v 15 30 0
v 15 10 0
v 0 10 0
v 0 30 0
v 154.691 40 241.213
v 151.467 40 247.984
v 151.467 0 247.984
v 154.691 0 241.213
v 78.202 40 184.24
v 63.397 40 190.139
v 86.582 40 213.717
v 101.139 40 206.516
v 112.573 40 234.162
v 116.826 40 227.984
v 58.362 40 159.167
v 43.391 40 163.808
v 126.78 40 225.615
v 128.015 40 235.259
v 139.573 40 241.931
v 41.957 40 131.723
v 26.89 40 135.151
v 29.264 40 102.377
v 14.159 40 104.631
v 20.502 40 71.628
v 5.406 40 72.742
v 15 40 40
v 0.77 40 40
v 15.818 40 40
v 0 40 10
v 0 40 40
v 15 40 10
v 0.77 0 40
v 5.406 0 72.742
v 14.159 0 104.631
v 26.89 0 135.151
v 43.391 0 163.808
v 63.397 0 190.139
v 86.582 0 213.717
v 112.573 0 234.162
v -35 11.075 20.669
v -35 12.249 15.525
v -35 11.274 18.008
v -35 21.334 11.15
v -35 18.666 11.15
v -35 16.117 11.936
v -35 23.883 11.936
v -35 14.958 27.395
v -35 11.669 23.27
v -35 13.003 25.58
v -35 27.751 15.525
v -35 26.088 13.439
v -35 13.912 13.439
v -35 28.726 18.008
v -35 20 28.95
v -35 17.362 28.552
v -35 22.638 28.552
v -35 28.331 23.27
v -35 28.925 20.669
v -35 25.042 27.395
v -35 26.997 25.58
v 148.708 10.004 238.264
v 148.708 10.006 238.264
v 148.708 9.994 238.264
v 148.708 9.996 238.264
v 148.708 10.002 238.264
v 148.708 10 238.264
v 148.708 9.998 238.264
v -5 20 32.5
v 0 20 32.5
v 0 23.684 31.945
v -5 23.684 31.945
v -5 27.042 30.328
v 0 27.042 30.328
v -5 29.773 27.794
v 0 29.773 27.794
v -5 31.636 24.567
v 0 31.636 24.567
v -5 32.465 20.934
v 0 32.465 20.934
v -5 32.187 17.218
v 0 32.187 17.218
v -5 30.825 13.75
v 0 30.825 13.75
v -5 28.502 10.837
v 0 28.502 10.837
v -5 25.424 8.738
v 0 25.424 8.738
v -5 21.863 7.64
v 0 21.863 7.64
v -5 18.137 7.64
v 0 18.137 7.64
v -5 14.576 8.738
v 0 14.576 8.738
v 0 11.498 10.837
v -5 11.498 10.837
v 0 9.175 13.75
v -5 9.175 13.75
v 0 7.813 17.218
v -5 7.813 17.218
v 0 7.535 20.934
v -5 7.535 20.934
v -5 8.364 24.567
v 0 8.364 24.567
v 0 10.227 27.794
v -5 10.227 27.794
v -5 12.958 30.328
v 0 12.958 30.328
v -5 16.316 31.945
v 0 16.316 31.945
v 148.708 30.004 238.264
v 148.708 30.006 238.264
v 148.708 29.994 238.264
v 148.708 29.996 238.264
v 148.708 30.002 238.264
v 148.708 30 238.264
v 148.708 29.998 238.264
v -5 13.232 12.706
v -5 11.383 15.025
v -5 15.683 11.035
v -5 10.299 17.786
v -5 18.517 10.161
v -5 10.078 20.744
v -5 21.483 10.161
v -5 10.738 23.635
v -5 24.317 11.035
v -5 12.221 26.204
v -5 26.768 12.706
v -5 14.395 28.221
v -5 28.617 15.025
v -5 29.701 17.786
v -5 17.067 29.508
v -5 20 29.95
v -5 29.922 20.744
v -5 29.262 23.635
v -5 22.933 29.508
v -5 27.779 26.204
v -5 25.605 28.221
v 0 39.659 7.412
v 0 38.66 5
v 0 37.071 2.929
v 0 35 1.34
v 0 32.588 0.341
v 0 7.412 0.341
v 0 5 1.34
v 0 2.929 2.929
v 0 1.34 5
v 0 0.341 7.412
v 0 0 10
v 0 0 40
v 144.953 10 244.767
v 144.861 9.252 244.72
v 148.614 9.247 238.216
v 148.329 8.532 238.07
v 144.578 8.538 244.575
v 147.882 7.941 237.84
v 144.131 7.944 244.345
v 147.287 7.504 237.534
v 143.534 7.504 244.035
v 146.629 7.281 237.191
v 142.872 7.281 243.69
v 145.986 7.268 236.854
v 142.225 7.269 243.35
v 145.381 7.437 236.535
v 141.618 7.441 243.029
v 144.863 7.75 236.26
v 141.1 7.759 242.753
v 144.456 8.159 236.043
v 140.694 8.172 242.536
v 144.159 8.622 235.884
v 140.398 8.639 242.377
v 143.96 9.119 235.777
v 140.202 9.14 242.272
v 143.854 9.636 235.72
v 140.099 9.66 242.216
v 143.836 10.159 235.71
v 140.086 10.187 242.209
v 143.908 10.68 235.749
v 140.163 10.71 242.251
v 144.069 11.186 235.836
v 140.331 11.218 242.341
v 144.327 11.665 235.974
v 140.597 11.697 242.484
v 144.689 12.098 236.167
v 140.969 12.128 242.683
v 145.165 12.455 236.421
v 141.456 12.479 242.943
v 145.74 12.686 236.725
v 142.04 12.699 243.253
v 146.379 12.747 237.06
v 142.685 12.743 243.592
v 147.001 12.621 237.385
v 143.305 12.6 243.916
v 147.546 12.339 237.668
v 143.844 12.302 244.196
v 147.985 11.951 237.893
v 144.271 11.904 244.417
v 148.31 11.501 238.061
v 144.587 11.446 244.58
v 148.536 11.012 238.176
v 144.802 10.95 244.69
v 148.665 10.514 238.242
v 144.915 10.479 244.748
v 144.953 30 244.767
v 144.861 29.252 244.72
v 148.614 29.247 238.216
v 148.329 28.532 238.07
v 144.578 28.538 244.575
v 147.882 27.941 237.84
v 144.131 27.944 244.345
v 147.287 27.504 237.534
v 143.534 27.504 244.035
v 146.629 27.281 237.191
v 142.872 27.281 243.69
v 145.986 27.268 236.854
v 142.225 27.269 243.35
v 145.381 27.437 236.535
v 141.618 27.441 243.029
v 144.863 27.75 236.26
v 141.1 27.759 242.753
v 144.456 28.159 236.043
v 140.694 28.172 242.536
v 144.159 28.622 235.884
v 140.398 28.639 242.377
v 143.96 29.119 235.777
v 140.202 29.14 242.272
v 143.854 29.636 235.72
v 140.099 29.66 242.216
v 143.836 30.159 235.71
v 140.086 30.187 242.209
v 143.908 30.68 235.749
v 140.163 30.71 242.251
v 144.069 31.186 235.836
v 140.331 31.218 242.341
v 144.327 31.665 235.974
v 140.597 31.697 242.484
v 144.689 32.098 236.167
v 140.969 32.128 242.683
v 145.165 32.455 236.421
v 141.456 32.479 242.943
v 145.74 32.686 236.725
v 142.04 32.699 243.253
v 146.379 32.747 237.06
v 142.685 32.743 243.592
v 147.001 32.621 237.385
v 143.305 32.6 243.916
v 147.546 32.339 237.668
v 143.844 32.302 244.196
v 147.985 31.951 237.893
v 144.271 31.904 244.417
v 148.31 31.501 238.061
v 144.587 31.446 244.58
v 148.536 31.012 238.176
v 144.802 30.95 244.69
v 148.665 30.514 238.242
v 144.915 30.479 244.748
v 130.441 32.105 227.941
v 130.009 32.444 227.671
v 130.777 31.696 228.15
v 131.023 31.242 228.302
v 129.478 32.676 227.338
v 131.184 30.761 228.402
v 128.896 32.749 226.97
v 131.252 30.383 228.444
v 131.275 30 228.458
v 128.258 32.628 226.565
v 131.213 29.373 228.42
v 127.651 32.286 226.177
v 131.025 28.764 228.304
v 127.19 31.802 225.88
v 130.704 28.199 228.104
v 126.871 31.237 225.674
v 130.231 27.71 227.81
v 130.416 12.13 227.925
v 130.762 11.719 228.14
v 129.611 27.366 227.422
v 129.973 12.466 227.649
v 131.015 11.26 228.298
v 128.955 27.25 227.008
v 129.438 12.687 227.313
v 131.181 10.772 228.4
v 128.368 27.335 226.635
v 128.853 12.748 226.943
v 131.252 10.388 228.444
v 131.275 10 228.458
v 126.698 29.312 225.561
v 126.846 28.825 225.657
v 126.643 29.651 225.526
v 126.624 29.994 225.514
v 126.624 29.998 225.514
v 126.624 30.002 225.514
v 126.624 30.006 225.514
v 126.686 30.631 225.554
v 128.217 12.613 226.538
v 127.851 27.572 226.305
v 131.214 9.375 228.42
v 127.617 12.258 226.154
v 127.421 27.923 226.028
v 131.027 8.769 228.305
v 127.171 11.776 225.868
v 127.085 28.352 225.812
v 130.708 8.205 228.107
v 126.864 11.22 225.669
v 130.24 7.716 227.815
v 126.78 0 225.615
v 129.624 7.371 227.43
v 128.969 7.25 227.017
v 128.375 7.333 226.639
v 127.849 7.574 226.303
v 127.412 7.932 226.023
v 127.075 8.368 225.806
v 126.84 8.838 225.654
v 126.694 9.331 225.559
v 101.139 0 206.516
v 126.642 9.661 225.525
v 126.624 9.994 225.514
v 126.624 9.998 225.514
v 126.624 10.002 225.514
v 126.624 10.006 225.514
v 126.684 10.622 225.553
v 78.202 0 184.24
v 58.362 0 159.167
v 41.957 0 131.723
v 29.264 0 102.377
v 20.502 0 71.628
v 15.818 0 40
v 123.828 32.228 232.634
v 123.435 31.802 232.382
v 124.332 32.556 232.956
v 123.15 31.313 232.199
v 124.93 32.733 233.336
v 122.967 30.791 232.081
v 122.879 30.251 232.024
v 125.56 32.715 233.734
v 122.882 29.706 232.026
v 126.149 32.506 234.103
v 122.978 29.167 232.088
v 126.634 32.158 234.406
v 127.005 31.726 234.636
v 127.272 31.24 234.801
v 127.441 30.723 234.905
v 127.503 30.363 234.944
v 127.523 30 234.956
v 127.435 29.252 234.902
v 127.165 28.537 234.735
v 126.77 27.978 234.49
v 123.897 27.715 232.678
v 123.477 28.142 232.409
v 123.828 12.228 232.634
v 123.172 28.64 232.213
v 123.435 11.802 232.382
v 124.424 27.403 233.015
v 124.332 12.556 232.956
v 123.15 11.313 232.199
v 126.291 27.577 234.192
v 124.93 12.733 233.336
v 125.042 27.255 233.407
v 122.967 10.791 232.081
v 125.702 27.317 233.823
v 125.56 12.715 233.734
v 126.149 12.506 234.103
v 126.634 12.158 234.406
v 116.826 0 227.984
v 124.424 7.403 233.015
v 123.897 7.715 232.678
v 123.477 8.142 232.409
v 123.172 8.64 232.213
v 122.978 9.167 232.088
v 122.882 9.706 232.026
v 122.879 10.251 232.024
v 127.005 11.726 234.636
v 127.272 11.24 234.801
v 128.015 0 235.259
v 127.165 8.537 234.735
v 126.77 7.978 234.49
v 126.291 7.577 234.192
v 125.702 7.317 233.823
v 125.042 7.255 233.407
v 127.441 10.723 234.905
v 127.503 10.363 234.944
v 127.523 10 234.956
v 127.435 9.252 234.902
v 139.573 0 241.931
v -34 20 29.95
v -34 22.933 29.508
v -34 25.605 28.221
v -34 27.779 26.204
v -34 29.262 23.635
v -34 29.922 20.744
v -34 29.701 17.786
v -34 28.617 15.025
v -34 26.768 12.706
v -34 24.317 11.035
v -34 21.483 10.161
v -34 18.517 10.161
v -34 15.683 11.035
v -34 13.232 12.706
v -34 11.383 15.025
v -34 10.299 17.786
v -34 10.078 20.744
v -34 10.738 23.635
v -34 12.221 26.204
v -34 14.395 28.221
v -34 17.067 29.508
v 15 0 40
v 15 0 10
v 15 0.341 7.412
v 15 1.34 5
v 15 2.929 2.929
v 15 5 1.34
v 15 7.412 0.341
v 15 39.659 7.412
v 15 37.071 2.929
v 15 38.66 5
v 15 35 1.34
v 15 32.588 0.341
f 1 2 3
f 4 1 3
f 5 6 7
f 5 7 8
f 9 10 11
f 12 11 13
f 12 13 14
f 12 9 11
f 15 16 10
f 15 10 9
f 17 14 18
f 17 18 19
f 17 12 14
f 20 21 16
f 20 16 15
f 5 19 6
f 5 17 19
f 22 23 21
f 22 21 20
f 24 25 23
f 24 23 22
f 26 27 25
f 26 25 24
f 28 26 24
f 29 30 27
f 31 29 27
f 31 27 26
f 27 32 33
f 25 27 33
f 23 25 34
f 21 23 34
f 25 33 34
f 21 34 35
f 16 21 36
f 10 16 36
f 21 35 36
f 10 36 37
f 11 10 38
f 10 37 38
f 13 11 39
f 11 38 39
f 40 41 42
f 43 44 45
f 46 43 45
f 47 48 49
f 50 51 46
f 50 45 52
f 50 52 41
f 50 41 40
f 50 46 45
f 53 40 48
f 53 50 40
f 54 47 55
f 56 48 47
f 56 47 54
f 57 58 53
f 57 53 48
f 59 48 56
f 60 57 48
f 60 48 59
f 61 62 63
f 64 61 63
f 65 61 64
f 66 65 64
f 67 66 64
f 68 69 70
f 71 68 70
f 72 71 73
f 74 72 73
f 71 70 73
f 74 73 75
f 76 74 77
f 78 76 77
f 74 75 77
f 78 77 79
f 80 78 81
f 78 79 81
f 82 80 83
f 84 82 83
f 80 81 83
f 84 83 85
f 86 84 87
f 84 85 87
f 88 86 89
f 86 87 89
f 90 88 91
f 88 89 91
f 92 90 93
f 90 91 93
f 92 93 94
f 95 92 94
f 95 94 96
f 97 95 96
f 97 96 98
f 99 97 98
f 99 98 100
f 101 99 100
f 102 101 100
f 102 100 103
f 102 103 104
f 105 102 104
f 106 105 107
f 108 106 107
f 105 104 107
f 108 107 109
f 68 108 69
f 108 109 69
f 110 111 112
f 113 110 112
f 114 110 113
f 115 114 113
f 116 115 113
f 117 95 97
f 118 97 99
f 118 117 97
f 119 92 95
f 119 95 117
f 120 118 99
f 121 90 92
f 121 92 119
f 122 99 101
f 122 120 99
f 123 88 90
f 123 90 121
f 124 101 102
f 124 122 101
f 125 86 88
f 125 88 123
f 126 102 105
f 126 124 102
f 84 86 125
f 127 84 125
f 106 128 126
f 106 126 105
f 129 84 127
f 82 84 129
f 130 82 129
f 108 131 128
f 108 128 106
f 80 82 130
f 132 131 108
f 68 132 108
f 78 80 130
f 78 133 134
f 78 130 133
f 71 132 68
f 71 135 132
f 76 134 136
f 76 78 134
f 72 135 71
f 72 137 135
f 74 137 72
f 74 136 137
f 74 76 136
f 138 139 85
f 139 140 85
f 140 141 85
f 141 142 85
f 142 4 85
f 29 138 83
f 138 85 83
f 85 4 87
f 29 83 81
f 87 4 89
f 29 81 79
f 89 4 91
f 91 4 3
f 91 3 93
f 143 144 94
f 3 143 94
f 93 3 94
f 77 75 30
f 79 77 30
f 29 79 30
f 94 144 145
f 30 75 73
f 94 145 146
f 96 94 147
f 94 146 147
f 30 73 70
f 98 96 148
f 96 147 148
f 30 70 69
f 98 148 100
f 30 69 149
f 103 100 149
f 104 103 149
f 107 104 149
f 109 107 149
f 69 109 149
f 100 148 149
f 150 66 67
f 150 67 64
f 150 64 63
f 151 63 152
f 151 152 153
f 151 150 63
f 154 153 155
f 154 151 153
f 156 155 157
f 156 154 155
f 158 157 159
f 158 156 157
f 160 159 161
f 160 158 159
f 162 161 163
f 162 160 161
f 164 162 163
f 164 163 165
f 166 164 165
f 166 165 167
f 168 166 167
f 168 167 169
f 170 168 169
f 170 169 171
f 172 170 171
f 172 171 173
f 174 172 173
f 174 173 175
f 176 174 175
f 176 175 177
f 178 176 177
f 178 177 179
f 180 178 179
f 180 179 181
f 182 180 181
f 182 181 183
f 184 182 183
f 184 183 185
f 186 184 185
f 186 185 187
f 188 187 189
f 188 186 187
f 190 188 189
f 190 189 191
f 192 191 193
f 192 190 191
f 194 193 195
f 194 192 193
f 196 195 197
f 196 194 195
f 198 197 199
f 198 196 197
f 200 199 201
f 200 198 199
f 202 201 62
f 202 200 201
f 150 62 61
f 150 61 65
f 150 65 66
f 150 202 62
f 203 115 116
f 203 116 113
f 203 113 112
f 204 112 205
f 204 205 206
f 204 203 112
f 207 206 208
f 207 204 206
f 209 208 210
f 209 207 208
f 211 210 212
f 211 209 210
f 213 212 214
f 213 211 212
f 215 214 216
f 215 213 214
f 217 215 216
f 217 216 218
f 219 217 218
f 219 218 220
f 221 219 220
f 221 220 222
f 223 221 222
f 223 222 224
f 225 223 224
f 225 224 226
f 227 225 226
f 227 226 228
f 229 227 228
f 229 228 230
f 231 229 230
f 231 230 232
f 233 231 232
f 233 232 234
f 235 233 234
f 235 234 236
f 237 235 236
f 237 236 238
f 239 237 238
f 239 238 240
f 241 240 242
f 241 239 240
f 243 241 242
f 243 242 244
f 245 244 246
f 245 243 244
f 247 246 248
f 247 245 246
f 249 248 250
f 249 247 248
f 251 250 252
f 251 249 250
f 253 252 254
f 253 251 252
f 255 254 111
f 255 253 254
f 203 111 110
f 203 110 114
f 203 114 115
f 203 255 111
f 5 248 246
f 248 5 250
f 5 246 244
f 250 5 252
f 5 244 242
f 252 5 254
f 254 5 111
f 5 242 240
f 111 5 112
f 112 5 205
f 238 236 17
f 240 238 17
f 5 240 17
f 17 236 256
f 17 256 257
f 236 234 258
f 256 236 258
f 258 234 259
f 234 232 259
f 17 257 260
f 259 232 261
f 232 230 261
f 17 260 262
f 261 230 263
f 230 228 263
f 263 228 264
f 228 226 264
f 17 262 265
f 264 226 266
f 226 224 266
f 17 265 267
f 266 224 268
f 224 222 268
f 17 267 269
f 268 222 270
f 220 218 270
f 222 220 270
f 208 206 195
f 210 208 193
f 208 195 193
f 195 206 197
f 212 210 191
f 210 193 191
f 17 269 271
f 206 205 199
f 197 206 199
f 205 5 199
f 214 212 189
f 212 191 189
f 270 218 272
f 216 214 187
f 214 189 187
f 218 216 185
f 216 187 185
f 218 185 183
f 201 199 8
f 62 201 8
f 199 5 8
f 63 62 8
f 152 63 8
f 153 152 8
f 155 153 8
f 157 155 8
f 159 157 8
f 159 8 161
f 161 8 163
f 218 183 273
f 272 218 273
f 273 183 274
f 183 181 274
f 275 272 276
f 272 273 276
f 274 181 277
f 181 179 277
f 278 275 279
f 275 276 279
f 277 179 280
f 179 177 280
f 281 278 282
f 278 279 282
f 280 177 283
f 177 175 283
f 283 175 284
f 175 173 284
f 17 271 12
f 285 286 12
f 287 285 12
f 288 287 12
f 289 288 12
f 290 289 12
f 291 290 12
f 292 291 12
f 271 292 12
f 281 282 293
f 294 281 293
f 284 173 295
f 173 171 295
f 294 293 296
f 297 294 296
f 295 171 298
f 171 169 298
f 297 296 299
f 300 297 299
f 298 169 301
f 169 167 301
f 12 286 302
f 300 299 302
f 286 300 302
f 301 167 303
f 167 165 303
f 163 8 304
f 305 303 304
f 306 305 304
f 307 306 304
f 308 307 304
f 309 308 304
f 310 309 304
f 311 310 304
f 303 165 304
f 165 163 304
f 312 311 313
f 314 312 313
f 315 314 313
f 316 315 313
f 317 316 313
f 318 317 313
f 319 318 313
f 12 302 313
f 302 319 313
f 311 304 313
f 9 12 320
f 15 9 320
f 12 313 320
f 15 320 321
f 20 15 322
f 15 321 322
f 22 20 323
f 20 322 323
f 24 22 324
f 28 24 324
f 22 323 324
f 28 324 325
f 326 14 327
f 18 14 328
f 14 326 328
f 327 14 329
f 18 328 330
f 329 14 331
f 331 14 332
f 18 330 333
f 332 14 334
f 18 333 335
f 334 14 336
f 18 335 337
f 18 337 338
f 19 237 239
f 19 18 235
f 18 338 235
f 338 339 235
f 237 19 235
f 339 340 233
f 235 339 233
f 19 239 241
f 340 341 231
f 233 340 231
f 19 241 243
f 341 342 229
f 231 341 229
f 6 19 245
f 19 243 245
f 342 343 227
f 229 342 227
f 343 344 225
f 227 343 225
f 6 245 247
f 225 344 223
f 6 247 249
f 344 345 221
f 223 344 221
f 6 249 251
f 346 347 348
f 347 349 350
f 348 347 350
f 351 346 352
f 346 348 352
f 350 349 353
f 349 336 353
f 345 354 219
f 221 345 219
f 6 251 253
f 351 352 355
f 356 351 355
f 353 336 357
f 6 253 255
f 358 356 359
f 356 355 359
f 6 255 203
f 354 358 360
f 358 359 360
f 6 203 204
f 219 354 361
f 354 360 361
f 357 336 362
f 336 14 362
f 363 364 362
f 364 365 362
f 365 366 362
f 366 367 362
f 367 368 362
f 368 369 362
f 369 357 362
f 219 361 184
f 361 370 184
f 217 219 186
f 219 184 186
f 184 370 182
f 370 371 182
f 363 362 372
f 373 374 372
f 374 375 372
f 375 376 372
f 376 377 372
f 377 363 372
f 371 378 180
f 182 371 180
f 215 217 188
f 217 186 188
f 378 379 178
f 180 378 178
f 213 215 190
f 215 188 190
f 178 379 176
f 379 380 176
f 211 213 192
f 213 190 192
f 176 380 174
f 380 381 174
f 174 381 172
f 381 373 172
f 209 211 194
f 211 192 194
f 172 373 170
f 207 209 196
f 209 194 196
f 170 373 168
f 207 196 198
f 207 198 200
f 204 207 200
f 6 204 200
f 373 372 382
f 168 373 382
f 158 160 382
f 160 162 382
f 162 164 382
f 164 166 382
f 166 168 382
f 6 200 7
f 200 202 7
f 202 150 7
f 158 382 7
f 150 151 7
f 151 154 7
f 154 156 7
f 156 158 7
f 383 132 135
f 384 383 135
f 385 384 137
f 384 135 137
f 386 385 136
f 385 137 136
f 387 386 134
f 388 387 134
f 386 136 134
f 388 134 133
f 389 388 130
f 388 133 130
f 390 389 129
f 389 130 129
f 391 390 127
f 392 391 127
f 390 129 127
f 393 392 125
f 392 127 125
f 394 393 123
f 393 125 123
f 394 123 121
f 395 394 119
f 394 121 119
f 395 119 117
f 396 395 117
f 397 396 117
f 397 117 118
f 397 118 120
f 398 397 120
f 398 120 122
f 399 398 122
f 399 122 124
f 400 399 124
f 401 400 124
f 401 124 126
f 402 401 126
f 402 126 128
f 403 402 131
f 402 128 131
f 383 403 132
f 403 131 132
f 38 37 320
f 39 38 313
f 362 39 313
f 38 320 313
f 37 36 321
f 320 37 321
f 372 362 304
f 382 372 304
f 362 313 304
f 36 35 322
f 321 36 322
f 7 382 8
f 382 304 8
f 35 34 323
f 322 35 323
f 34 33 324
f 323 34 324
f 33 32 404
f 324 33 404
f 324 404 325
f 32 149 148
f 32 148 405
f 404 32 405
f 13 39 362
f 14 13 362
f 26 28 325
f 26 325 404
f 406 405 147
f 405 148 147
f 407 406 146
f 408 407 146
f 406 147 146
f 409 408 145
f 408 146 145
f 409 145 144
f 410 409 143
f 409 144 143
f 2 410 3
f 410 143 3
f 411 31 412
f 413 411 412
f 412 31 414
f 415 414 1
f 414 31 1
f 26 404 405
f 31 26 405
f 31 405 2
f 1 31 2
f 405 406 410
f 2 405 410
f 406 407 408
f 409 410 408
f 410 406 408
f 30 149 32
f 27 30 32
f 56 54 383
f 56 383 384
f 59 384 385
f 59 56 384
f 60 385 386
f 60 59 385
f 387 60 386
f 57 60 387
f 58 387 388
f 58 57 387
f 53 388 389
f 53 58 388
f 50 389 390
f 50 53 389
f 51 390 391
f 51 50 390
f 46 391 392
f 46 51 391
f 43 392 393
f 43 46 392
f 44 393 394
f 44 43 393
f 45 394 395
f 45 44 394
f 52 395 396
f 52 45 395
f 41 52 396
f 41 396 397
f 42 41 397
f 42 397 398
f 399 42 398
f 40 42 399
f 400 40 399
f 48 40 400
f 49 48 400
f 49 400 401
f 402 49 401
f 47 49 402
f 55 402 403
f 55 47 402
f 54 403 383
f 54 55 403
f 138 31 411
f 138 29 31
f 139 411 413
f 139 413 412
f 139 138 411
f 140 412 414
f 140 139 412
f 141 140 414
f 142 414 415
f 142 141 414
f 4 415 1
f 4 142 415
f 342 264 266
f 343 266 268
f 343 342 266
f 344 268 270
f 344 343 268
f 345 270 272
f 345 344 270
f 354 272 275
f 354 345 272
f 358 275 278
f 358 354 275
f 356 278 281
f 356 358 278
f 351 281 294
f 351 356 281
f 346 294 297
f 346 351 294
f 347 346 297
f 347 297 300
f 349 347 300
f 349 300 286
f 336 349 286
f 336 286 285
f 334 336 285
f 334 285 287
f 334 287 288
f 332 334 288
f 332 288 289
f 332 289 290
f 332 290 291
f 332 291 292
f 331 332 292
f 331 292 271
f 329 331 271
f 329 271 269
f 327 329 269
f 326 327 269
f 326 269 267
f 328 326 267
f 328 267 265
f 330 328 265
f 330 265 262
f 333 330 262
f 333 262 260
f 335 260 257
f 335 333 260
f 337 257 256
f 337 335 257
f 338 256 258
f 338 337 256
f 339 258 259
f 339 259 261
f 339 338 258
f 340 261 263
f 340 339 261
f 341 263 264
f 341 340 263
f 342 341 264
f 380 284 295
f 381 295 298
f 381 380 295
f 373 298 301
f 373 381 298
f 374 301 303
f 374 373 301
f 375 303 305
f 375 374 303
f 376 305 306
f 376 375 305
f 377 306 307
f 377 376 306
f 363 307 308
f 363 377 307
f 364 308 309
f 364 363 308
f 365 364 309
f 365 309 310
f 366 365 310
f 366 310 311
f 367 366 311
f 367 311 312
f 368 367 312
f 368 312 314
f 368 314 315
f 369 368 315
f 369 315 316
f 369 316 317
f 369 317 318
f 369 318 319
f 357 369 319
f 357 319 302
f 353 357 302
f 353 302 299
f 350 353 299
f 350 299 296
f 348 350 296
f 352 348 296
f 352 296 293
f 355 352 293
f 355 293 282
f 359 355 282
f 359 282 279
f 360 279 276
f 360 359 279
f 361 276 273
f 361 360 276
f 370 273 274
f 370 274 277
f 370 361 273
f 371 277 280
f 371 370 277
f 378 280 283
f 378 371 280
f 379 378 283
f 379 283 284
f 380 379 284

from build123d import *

# Parameters (mm, degrees)
BOSS_EXTRUDE4_DEPTH          = 40
SKETCH18_R                   = 12.5
BOSS_EXTRUDE2_DEPTH          = 5
SKETCH19_R                   = 9.95
BOSS_EXTRUDE3_DEPTH          = 30
FILLET1_R                    = 10
M5_START                     = -139.716402581
M5_CLEARANCE_HOLE2_OUTLINE_R = 2.75
M5_CLEARANCE_HOLE2_DEPTH     = 7.727879289
CHAMFER1_SIZE                = 1


# Read off the part's stored shape, not the designer's step: M5 Clearance Hole2
with BuildPart() as part:
    # Sketch20 → Boss-Extrude4 (new body)
    with BuildSketch(Plane(origin=(0, 0, 0), x_dir=(1, 0, 0), z_dir=(0, 1, 0))):
        with BuildLine():
            Line((112.573466187, -234.162128136), (116.826154662, -227.98437444))
            ThreePointArc((116.826154662, -227.98437444), (133.75, -238.671414456), (151.467170814, -247.98437444))
            Line((151.467170814, -247.98437444), (154.690918215, -241.212561338))
            ThreePointArc((154.690918215, -241.212561338), (58.362499128, -159.166512646), (15.817691059, -40))
            Line((15.817691059, -40), (15, -40))
            Line((15, -40), (15, -20))
            Line((15, -20), (15, 0))
            Line((15, 0), (0, 0))
            Line((0, 0), (0, -20))
            Line((0, -20), (0, -40))
            Line((0, -40), (0.770372064, -40))
            ThreePointArc((0.770372064, -40), (34.68457338, -149.741891952), (112.573466187, -234.162128136))
        make_face()
    extrude(amount=BOSS_EXTRUDE4_DEPTH)

    # Sketch18 → Boss-Extrude2 (add)
    with BuildSketch(Plane.ZY):
        with Locations((20, 20)):
            Circle(SKETCH18_R)
    extrude(amount=BOSS_EXTRUDE2_DEPTH)

    # Sketch19 → Boss-Extrude3 (add)
    with BuildSketch(Plane.ZY.offset(5)):
        with Locations((20, 20)):
            Circle(SKETCH19_R)
    extrude(amount=BOSS_EXTRUDE3_DEPTH)

    # Fillet1
    fillet1_edges = [part.edges().sort_by_distance(p)[0] for p in [
        (7.5, 0, 0),
        (7.5, 40, 0),
    ]]
    fillet(fillet1_edges, radius=FILLET1_R)

    # M5 Clearance Hole2 outline → M5 Clearance Hole2 (cut)
    with BuildSketch(Plane(origin=(0, 0, 0), x_dir=(0.8660254037844398, 0, 0.499999999999998), z_dir=(0.49999999999999795, 0, -0.8660254037844399)).offset(M5_START)):
        with Locations((245.166604984, -30)):
            Circle(M5_CLEARANCE_HOLE2_OUTLINE_R)
        with Locations((225.166604984, -10)):
            Circle(M5_CLEARANCE_HOLE2_OUTLINE_R)
        with Locations((225.166604984, -30)):
            Circle(M5_CLEARANCE_HOLE2_OUTLINE_R)
        with Locations((245.166604984, -10)):
            Circle(M5_CLEARANCE_HOLE2_OUTLINE_R)
    extrude(amount=M5_CLEARANCE_HOLE2_DEPTH, mode=Mode.SUBTRACT)

    # Chamfer1
    chamfer1_edges = [part.edges().sort_by_distance(p)[0] for p in [
        (-35, 20, 10.05),
    ]]
    chamfer(chamfer1_edges, length=CHAMFER1_SIZE)


solid = part.part
